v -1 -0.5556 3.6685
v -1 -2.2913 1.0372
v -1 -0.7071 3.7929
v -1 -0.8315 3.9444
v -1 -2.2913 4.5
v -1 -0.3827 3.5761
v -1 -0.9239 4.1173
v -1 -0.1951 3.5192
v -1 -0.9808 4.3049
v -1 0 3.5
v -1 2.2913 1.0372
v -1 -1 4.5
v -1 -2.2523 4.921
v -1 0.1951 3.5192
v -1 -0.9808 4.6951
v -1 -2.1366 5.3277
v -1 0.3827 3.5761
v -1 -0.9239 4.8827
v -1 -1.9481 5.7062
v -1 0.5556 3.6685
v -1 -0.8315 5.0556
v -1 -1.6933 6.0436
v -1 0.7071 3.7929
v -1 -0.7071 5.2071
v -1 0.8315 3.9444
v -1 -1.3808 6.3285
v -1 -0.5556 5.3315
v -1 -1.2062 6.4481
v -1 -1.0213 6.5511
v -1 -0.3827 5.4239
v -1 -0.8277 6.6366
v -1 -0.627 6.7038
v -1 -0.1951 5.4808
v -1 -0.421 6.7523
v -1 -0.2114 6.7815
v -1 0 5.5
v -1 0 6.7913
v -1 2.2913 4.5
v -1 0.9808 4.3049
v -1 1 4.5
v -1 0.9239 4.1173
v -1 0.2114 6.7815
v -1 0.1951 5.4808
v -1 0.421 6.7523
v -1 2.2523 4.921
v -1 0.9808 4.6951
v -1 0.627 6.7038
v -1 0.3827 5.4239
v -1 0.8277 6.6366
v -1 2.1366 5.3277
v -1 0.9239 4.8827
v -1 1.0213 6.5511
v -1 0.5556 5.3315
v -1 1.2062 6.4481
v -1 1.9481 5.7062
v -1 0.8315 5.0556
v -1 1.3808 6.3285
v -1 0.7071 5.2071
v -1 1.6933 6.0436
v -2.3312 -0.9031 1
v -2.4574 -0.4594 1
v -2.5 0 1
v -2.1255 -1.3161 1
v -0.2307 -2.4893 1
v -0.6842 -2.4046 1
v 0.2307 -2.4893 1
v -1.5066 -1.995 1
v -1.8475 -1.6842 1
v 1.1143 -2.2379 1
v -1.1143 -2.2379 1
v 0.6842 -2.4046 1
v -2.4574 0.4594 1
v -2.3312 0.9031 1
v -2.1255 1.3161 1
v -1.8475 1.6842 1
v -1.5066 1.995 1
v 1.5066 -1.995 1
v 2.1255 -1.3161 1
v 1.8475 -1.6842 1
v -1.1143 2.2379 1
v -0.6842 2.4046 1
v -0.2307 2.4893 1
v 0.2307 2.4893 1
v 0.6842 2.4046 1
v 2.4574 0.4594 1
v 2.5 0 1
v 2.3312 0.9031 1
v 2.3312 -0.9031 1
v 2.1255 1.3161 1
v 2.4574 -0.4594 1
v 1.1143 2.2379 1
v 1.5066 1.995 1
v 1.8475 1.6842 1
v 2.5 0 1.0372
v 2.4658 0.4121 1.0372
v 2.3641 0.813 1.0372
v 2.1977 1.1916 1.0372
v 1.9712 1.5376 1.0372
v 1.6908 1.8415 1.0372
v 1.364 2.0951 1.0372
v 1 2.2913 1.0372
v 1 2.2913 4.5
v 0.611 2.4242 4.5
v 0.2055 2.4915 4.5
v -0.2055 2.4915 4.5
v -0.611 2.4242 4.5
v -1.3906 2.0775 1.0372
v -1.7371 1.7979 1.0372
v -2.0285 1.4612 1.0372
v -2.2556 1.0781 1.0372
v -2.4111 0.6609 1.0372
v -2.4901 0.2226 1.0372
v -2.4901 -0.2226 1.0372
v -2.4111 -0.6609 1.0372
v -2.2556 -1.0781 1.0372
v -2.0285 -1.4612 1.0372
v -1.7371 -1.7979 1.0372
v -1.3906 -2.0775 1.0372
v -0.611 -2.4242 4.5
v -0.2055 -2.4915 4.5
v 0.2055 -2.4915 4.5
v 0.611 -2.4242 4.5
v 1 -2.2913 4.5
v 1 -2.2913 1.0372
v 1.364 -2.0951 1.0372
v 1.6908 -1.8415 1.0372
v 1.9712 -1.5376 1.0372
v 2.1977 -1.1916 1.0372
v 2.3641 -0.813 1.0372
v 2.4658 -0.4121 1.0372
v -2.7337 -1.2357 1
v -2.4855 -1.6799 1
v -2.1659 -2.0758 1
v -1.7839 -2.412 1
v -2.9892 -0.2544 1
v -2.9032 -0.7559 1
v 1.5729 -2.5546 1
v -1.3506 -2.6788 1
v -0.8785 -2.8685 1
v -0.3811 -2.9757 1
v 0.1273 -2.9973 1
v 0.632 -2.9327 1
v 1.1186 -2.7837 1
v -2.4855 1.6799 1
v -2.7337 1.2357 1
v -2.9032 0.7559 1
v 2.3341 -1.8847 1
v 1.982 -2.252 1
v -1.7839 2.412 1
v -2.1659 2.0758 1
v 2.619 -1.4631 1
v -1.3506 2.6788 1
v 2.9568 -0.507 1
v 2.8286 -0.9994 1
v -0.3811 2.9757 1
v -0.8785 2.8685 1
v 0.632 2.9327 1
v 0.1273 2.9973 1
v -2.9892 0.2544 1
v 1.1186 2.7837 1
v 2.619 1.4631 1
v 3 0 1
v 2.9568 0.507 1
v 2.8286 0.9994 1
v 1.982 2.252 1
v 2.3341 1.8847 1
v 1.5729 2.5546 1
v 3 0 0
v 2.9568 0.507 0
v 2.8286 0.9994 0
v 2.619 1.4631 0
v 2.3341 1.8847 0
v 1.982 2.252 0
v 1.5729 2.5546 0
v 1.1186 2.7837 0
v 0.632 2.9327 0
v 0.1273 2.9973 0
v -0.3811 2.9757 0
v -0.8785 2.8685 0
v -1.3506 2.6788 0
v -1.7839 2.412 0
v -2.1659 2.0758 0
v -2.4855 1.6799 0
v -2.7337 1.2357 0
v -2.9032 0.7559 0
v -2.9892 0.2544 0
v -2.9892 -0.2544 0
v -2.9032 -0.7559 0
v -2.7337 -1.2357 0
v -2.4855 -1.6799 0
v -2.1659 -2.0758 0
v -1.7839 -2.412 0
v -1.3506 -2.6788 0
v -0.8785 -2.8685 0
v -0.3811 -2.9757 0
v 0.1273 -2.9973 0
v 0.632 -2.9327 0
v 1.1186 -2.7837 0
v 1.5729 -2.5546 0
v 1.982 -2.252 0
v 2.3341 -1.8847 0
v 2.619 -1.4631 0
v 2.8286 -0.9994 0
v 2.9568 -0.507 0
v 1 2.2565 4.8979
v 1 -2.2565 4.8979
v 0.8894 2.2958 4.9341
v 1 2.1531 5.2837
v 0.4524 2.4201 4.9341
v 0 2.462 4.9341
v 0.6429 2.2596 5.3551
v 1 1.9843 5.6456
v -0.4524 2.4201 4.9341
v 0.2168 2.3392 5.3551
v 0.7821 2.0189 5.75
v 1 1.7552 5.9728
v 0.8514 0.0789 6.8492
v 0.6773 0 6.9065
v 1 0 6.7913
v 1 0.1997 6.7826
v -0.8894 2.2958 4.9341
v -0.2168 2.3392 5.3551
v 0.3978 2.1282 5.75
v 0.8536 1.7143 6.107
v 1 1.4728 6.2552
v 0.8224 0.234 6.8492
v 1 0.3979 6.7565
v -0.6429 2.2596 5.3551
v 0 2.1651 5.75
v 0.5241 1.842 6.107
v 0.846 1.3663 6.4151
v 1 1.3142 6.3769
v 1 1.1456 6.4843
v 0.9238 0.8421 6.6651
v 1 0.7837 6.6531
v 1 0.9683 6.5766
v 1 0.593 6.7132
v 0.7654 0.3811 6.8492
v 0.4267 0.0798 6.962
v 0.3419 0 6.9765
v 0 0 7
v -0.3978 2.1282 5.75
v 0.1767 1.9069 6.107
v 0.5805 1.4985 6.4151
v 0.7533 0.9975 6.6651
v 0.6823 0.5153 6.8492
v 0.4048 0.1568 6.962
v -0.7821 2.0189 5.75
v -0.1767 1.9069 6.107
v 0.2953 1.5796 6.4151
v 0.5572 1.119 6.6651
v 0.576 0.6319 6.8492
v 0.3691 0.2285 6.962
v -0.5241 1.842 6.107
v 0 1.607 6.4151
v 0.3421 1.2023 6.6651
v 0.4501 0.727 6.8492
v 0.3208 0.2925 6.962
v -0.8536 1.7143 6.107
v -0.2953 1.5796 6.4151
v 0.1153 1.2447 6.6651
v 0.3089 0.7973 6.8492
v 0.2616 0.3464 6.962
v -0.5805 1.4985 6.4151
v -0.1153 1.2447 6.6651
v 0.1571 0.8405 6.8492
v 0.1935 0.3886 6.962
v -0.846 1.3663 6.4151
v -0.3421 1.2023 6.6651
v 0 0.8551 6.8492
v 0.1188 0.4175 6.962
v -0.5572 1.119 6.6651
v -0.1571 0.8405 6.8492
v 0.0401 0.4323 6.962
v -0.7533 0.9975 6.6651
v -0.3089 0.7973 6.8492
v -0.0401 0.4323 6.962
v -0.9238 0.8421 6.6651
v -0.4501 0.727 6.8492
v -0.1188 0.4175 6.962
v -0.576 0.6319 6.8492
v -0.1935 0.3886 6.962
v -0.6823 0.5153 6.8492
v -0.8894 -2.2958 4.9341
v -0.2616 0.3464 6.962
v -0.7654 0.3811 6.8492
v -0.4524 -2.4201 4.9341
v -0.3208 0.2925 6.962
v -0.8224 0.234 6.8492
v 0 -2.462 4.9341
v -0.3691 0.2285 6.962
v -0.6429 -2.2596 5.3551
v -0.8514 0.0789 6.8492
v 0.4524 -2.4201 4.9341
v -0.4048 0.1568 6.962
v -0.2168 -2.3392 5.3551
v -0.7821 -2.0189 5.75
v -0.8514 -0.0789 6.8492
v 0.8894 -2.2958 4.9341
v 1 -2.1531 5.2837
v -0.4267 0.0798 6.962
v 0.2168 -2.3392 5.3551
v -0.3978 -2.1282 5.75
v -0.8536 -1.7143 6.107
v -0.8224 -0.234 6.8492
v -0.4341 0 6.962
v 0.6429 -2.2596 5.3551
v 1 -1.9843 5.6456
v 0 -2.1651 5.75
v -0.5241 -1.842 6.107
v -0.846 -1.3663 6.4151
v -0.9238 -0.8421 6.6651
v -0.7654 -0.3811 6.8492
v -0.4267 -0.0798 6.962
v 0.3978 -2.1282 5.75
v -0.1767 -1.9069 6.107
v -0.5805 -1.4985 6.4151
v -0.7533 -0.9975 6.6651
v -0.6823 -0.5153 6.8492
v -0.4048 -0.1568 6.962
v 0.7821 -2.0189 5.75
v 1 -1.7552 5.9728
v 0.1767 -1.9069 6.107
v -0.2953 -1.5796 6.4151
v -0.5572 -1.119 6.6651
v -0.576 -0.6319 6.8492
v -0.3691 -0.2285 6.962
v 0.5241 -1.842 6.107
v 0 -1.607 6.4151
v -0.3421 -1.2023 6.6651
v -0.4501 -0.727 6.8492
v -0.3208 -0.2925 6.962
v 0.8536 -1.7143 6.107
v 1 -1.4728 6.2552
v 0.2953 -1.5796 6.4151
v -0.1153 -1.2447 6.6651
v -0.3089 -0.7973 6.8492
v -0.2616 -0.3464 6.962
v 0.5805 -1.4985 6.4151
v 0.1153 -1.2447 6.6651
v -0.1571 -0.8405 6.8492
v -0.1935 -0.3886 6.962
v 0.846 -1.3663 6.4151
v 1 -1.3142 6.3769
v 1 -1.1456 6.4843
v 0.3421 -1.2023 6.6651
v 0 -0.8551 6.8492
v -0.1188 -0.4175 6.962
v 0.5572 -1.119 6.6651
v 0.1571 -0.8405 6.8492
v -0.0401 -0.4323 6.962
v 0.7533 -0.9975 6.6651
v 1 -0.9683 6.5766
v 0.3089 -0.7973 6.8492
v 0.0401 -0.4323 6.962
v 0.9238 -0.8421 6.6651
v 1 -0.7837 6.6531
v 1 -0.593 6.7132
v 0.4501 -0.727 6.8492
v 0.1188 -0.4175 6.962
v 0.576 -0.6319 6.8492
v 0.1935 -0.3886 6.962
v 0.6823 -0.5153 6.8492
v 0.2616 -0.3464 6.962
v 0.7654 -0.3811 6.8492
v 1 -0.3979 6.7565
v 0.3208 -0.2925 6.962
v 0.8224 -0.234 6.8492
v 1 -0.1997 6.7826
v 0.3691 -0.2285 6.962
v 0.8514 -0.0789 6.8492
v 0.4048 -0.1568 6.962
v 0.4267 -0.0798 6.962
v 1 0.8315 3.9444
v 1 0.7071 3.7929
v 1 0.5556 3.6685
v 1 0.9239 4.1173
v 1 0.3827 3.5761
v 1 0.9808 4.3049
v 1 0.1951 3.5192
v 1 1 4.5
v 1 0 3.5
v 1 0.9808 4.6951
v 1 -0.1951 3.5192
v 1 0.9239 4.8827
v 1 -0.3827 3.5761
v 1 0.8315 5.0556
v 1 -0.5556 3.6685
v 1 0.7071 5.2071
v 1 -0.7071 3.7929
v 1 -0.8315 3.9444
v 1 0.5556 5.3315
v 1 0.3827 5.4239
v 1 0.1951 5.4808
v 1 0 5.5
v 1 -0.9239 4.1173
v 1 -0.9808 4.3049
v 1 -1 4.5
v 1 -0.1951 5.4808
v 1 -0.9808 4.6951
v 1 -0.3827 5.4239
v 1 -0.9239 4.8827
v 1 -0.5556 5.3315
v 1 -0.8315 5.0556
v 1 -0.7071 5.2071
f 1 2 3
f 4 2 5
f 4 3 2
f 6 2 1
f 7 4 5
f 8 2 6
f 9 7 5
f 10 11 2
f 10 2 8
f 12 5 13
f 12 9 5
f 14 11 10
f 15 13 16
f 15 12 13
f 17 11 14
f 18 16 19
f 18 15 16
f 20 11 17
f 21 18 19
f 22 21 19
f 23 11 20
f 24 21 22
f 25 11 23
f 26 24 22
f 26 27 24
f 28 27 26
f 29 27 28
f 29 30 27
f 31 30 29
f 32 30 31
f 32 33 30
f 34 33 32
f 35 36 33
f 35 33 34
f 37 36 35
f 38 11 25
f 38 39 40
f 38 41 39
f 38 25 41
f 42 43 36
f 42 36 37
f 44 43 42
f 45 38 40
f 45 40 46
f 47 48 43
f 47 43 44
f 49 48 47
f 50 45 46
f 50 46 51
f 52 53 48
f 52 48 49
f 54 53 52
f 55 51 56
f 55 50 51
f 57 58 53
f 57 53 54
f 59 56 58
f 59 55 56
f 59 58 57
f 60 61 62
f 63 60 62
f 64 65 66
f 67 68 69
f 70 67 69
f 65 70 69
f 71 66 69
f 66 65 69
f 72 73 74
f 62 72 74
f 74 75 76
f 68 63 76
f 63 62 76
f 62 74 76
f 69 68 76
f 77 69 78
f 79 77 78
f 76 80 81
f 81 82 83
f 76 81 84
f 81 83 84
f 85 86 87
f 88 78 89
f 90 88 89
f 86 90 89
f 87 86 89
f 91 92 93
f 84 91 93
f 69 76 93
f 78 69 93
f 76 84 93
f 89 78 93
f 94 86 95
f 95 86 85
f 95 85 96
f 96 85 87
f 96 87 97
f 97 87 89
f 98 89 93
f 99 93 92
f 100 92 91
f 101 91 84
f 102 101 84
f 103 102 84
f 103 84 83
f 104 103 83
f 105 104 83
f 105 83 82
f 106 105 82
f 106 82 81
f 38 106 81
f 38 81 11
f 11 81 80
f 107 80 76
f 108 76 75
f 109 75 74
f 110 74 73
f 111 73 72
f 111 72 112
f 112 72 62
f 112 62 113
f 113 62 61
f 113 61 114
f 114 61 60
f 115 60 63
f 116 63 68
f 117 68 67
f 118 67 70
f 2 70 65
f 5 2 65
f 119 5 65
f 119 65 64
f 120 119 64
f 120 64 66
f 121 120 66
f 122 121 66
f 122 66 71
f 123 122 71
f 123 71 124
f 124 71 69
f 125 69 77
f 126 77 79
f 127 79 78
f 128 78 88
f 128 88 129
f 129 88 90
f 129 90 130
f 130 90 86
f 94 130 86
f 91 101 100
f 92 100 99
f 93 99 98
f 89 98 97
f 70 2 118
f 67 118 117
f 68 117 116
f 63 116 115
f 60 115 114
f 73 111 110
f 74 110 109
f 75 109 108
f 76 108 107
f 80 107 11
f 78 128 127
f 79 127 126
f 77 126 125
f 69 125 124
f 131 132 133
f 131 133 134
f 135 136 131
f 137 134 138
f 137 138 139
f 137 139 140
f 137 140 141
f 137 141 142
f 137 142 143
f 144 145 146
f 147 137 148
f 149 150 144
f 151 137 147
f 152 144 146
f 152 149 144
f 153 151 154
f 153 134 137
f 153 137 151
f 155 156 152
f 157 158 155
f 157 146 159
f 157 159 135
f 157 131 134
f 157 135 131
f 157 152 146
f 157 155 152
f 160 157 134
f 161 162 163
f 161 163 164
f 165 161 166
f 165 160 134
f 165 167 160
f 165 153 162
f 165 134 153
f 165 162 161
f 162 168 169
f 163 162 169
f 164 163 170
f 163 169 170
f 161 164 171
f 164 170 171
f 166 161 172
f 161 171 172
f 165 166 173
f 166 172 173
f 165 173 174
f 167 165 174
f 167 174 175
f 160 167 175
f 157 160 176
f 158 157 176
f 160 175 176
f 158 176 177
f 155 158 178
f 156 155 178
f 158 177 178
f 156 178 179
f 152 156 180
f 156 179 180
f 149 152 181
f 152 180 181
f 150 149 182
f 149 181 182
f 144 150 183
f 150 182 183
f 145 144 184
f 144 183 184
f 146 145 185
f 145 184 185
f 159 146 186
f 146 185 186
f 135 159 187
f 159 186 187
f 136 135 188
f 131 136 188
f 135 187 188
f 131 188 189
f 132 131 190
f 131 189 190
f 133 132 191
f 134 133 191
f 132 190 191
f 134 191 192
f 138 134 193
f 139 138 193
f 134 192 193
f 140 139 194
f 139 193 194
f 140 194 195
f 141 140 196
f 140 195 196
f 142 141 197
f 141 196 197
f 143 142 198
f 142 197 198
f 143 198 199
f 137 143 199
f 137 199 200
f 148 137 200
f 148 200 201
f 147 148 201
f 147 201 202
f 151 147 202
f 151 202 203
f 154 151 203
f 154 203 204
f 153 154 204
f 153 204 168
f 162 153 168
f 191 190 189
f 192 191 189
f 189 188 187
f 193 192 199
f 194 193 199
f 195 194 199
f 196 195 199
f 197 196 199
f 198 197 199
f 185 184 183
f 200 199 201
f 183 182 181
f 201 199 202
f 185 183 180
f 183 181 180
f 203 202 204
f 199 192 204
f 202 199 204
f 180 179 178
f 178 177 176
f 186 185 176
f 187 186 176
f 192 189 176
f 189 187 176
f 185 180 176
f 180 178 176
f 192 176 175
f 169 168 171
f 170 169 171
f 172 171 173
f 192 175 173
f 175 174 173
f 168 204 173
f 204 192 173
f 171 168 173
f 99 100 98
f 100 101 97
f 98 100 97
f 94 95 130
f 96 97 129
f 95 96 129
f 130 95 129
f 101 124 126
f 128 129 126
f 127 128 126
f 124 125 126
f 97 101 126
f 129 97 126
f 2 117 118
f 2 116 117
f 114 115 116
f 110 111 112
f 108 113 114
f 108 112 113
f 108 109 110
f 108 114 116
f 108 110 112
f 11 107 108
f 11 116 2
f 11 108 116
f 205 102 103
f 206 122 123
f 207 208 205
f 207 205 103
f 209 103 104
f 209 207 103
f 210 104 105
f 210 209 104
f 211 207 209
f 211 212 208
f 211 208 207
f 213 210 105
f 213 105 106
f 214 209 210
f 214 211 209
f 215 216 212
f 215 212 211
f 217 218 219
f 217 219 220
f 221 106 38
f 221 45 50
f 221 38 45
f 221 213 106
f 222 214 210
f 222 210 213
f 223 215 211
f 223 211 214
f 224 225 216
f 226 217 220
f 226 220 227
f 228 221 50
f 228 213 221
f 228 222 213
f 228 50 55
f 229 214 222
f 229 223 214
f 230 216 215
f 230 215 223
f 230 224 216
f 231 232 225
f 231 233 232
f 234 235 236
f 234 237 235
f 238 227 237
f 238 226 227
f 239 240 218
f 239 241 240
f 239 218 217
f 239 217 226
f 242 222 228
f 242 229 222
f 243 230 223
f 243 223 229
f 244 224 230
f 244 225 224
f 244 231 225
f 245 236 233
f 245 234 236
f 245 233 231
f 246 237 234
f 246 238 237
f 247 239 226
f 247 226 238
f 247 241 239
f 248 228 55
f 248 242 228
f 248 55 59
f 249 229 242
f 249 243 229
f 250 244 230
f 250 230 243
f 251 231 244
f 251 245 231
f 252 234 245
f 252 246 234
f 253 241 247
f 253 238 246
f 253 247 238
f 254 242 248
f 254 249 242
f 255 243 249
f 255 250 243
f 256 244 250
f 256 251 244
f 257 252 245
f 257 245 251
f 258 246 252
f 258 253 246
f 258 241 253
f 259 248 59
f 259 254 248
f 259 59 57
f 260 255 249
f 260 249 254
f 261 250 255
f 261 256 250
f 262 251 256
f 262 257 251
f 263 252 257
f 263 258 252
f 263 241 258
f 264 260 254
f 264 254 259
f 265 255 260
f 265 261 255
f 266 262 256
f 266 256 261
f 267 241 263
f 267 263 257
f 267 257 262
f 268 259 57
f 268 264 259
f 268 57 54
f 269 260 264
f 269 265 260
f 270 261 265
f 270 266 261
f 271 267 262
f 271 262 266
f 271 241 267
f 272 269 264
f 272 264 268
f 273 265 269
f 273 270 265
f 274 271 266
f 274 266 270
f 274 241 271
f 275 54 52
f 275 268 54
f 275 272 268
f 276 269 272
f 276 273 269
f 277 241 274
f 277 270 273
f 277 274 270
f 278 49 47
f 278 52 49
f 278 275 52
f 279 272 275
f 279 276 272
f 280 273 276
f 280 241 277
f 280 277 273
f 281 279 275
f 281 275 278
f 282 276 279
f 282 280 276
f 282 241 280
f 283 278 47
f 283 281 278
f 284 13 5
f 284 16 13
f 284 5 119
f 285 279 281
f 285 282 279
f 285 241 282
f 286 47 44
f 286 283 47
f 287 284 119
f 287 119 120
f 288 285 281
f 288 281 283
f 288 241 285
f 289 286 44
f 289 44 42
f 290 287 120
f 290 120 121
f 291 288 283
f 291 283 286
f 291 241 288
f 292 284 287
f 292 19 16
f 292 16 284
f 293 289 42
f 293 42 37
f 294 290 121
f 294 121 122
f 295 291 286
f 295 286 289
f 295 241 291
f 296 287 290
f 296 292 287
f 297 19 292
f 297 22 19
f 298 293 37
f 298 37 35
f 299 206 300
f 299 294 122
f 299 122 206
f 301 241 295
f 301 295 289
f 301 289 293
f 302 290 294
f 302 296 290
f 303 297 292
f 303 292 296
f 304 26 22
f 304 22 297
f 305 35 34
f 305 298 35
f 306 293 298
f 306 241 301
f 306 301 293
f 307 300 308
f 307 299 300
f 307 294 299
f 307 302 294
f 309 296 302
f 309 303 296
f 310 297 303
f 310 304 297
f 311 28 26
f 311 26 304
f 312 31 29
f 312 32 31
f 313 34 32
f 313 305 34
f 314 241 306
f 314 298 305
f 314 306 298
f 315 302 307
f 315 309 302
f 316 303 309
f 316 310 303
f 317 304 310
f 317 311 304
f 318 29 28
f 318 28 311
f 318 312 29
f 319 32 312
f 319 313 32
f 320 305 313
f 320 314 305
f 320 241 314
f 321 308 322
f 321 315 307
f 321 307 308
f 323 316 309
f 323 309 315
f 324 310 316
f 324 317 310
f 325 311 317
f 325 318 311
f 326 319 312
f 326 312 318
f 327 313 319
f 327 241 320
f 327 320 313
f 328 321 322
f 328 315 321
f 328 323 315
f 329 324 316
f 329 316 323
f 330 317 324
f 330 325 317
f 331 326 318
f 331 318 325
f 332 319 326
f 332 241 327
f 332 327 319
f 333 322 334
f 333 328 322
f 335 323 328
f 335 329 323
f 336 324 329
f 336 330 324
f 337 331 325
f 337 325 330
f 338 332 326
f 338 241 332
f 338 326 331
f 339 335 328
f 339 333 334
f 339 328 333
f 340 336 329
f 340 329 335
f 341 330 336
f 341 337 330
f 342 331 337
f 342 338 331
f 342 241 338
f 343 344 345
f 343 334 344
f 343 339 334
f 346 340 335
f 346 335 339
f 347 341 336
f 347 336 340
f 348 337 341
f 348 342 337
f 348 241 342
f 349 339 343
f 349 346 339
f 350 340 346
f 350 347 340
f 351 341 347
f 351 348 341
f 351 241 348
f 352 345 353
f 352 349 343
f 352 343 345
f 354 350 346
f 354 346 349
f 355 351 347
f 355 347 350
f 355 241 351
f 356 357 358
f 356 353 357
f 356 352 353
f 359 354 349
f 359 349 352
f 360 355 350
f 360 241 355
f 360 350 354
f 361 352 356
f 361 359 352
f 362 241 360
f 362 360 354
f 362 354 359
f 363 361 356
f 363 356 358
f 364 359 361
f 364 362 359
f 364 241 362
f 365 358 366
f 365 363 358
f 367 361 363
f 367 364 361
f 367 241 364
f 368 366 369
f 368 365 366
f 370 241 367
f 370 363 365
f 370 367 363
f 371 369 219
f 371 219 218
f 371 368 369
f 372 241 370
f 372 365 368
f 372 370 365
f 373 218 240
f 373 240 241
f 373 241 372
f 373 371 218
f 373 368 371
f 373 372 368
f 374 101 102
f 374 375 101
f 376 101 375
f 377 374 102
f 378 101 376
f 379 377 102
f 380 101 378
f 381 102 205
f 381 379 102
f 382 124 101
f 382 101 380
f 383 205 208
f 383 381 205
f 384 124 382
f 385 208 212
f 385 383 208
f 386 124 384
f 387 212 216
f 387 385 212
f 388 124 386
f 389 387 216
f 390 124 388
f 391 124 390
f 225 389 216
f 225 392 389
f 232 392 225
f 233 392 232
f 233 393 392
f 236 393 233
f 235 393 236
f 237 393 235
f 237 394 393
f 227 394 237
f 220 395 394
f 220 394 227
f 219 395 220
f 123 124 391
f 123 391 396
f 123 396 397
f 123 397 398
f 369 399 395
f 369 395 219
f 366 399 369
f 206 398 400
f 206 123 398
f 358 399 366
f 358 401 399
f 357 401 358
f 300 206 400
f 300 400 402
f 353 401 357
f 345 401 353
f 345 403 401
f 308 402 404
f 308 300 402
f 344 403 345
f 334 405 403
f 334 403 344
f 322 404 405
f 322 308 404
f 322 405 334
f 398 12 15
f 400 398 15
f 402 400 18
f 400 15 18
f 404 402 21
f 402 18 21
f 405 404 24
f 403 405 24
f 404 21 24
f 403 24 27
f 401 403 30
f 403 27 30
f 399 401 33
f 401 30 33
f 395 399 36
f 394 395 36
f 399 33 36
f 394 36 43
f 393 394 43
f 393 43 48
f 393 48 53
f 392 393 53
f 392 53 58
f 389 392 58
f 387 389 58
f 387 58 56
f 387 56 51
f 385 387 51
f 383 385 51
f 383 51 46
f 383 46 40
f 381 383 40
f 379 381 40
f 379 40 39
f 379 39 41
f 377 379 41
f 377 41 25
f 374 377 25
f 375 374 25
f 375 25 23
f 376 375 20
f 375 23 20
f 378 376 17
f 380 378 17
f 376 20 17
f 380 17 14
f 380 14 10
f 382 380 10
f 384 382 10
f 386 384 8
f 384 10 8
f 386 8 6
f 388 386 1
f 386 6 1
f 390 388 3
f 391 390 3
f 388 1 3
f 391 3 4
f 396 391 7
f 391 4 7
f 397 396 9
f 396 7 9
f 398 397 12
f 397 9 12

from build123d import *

# Parameters (mm, degrees)
F0_R     = 3
F1_DEPTH = 1
F2_R     = 2.5
F3_DEPTH = 6
F4_R     = 2.5
F5_W     = 2.002786
F5_H     = 9.596602
F5_W_2   = 1.770969
F6_DEPTH = 12.5
F7_R     = 1
F8_DEPTH = 4.001


with BuildPart() as f1:
    # F0 (on Top) → F1 (new body)
    with BuildSketch(Plane.XY):
        Circle(F0_R)
    extrude(amount=F1_DEPTH)


with BuildPart() as f3:
    # F2 (on face) → F3 (new body)
    with BuildSketch(Plane.XY.offset(1)):
        Circle(F2_R)
    extrude(amount=F3_DEPTH)

    # F4
    f4_edges = [f3.edges().sort_by_distance(p)[0] for p in [
        (-2.5, 0, 7),
    ]]
    fillet(f4_edges, radius=F4_R)

    # F5 (on Front) → F6 (cut, symmetric)
    with BuildSketch(Plane.XZ):
        with Locations((-2.001393, 5.835502)):
            Rectangle(F5_W, F5_H)
        with Locations((1.885485, 5.835502)):
            Rectangle(F5_W_2, F5_H)
    extrude(amount=F6_DEPTH, both=True, mode=Mode.SUBTRACT)

    # F7 (on face) → F8 (cut, through all)
    with BuildSketch(Plane(origin=(-1, 0, 0), x_dir=(0, -1, 0), z_dir=(-1, 0, 0))):
        with Locations((0, 4.5)):
            Circle(F7_R)
    extrude(amount=-F8_DEPTH, mode=Mode.SUBTRACT)


solid = Compound([f1.part, f3.part])
